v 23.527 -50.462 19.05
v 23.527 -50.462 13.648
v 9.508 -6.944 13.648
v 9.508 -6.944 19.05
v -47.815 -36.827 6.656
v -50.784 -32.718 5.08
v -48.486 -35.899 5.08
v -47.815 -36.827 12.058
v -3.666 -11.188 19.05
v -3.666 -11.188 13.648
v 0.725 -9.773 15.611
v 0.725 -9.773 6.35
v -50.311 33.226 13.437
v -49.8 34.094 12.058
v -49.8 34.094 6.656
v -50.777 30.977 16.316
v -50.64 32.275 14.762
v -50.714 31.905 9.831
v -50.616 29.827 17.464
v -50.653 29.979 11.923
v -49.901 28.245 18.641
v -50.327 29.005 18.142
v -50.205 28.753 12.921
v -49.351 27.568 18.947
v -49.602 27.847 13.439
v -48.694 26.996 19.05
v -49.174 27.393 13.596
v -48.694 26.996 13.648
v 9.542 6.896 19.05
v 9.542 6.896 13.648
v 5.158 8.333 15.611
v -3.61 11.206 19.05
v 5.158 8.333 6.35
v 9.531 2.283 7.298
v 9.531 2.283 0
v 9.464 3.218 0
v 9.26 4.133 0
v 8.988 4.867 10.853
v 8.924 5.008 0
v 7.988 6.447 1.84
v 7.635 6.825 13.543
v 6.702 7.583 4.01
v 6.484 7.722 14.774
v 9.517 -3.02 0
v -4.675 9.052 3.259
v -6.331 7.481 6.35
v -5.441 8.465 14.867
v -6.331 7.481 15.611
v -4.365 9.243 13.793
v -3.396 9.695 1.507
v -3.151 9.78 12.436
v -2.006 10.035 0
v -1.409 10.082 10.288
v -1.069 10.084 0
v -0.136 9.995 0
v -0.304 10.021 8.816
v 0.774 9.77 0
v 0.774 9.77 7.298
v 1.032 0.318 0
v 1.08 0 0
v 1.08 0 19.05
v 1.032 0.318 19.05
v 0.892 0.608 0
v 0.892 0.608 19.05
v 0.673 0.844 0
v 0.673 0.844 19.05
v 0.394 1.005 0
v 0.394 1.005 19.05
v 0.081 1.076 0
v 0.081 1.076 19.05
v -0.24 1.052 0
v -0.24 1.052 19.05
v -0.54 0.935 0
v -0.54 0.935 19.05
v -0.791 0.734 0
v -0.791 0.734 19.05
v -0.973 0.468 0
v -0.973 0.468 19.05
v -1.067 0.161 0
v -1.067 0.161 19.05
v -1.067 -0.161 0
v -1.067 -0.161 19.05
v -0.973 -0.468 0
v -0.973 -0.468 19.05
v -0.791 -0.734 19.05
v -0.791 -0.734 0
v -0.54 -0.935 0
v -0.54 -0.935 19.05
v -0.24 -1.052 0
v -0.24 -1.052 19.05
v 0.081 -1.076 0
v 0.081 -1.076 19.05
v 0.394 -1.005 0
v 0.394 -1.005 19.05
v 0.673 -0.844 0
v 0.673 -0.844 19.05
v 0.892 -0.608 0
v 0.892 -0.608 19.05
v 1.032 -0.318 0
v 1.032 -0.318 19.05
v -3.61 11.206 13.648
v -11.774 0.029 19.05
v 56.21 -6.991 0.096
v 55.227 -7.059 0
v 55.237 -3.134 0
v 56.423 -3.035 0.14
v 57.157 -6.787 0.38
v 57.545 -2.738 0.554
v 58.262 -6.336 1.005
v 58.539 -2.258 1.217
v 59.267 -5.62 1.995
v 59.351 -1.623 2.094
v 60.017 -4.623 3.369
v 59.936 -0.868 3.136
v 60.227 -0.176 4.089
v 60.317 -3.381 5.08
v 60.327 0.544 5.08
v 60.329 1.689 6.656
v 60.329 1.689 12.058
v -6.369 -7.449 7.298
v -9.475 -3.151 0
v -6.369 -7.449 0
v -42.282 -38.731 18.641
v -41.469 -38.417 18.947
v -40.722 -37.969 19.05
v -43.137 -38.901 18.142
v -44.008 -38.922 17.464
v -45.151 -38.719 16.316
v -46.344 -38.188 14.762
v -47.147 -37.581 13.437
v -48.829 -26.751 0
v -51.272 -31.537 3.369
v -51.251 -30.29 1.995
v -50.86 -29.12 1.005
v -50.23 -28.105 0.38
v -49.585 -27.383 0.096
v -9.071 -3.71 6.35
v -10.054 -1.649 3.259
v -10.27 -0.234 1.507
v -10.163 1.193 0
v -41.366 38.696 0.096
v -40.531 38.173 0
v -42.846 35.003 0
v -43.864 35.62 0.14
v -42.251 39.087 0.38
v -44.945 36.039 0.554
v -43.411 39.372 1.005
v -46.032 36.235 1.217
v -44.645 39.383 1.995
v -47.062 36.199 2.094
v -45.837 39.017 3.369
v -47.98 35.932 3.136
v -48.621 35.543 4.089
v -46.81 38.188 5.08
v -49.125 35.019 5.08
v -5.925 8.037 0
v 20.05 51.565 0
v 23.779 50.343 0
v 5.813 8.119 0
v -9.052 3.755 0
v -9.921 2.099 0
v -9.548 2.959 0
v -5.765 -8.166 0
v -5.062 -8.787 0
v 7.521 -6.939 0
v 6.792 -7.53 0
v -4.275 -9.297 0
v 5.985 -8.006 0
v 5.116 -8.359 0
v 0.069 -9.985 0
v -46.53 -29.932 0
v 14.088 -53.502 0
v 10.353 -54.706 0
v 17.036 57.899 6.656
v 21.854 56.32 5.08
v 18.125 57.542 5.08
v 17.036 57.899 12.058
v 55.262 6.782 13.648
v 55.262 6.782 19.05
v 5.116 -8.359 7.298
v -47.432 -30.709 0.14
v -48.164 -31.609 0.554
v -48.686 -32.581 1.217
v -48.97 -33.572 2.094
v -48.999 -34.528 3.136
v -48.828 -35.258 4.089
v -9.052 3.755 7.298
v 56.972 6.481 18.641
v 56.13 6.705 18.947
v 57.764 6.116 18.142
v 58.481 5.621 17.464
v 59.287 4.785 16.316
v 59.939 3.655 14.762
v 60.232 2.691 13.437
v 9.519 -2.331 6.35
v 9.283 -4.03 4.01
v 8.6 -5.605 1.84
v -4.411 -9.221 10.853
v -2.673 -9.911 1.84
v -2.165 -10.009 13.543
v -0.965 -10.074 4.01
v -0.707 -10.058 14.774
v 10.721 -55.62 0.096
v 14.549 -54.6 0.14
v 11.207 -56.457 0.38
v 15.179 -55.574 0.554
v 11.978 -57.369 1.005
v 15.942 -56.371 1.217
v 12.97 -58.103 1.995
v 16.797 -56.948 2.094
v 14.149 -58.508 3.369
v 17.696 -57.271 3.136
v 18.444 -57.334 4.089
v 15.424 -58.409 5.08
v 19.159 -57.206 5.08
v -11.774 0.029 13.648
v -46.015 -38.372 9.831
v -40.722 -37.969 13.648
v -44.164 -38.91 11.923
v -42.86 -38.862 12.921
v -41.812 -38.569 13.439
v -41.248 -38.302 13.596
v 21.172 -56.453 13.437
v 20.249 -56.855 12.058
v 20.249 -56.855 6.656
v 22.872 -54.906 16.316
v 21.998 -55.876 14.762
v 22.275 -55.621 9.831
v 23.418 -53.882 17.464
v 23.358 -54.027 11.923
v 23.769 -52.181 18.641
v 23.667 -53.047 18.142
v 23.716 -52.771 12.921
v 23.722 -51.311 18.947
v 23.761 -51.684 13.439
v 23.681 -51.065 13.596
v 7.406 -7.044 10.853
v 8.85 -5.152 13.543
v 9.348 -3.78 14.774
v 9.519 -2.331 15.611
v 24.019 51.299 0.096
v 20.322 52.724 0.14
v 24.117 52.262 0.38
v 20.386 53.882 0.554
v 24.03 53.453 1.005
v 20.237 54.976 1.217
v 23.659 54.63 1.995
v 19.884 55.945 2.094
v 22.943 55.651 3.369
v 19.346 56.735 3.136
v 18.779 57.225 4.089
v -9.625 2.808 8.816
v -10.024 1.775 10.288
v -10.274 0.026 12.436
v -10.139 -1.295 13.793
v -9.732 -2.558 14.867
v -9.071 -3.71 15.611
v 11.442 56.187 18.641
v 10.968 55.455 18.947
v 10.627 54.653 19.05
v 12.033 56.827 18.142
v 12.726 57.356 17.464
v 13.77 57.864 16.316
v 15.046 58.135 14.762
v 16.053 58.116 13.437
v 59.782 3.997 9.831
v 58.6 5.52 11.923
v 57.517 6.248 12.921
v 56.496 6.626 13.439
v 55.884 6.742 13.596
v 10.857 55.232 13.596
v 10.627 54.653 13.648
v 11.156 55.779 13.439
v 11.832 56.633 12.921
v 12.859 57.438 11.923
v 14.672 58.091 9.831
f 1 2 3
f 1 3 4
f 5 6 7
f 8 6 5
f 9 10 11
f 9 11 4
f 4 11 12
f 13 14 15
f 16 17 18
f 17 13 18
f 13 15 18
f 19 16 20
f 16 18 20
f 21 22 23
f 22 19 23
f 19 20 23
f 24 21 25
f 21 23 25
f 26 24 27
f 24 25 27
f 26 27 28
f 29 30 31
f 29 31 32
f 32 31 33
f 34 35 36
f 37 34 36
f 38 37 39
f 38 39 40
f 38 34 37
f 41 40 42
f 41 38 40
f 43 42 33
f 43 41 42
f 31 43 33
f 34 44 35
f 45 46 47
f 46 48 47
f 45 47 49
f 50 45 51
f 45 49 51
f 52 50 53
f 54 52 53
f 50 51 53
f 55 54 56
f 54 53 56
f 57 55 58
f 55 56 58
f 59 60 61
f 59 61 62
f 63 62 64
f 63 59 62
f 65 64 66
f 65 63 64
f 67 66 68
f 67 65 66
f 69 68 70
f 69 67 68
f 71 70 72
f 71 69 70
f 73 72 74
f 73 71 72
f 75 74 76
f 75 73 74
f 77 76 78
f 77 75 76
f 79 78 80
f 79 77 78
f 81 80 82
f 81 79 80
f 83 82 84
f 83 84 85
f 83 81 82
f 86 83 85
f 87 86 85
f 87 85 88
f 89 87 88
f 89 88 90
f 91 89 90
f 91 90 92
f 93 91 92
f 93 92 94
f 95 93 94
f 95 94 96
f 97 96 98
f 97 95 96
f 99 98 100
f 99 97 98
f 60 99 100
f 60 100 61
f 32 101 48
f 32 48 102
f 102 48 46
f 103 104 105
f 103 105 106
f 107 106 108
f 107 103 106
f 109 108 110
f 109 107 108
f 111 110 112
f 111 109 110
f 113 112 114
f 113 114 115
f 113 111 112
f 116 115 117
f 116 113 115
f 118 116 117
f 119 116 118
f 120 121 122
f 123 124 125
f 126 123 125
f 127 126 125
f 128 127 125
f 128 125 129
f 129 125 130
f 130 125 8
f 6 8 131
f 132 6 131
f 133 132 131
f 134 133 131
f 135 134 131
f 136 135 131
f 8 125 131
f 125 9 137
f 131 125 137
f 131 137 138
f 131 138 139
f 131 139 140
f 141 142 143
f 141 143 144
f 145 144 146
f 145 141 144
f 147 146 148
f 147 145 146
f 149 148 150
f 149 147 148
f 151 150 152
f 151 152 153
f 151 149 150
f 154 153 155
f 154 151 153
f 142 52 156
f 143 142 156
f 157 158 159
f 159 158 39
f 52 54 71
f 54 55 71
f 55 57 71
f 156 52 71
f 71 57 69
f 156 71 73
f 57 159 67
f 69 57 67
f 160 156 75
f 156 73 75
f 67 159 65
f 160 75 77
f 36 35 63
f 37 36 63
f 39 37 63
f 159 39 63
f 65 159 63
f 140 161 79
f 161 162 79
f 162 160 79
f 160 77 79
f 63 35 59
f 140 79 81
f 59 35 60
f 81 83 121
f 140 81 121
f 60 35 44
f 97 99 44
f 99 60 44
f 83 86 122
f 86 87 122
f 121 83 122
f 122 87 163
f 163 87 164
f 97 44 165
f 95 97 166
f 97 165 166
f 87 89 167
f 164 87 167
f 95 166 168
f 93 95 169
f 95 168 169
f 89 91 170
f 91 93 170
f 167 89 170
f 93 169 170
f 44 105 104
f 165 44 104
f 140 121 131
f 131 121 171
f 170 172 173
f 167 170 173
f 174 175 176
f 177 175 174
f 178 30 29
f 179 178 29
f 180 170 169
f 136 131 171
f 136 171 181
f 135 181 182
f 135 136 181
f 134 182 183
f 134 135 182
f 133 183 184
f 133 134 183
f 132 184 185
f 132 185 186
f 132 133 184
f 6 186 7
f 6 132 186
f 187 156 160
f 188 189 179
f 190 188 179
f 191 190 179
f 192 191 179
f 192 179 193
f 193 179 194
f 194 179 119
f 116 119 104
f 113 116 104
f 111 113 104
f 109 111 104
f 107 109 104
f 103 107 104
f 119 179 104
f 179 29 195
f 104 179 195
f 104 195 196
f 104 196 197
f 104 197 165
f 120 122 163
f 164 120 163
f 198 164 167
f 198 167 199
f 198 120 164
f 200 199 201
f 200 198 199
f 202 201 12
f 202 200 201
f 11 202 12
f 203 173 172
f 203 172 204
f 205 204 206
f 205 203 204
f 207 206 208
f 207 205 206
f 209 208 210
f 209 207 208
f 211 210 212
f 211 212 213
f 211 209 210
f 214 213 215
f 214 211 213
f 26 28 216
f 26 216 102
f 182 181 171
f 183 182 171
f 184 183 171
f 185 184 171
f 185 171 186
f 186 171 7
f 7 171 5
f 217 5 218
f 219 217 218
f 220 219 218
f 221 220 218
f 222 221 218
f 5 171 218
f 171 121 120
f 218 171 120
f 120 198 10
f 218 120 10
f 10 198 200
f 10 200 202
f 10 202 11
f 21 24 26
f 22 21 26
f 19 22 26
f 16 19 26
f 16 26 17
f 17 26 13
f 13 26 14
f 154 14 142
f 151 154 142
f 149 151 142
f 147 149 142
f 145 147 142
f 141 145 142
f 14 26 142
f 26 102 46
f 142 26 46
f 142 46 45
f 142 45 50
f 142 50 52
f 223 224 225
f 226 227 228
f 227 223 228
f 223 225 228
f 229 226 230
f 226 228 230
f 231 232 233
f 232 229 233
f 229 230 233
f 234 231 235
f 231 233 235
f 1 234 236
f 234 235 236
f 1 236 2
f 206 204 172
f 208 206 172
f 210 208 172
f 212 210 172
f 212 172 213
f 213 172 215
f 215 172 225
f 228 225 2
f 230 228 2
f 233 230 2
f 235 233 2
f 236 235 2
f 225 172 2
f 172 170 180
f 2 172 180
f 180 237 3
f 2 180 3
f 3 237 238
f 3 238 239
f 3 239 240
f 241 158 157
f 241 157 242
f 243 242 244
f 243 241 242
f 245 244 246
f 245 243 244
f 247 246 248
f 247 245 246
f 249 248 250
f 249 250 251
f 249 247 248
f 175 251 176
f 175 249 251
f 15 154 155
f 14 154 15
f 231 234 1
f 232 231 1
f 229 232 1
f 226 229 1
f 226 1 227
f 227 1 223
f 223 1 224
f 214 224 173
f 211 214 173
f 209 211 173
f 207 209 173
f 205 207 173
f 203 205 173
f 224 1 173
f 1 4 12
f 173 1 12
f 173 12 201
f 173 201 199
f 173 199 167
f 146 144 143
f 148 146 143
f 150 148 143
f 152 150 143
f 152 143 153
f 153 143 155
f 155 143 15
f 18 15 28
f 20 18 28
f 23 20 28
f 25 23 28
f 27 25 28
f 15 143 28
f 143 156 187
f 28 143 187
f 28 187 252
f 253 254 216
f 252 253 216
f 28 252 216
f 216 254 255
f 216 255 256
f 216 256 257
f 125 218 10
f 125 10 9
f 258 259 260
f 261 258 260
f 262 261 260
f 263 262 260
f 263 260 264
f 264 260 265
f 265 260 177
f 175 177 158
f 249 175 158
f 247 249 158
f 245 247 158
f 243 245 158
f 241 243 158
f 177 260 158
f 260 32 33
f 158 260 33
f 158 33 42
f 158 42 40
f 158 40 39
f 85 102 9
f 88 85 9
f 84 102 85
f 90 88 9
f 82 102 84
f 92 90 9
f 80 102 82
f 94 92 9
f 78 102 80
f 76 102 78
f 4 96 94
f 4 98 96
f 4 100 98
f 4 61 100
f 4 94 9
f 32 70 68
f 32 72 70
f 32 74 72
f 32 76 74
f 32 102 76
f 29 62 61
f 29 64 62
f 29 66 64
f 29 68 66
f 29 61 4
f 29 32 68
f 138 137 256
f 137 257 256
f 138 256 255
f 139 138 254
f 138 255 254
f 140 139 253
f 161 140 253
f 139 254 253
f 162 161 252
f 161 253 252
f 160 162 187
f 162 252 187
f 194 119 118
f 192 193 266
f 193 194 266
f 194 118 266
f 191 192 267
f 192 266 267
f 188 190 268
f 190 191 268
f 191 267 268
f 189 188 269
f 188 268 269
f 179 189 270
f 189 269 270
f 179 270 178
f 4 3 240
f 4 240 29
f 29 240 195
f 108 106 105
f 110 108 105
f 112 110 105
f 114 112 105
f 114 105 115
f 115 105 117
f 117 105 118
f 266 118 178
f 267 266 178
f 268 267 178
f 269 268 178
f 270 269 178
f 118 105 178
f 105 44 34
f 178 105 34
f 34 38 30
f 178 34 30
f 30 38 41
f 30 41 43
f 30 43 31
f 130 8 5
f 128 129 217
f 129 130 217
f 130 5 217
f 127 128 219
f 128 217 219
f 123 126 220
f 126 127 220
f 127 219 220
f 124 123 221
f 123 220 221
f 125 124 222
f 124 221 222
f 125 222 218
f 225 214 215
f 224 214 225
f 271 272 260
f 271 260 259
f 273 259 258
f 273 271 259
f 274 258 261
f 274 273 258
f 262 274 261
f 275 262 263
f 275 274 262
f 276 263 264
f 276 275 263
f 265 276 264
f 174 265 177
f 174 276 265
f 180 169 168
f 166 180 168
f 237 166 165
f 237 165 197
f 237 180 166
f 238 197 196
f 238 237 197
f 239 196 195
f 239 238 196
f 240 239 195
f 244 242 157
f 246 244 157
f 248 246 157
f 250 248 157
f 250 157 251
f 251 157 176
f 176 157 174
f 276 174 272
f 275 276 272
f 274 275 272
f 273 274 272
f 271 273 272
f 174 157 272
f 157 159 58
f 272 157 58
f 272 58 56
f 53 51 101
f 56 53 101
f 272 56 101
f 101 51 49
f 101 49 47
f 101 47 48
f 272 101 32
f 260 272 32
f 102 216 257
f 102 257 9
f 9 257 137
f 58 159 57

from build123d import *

# Parameters (mm, degrees)
F0_R          = 1.0795
F1_DEPTH      = 19.05
F3_DEPTH      = 50.8
F5_DEPTH      = 50.8
F7_DEPTH      = 50.8
F9_DEPTH      = 50.8
F11_DEPTH     = 50.8
F12_R         = 6.35
F13_T1_DEPTH  = 30.801632633
F13_T3_DEPTH  = 29.3245158286
F13_T5_DEPTH  = 29.3245158286
F13_T7_DEPTH  = 29.3245158286
F13_T9_DEPTH  = 29.3245158286
F13_T11_DEPTH = 29.3245158286


# Not quite as in the source:
# - a fillet or chamfer that OpenCascade refuses, or shapes differently, is made with other operations: its cross-section is extruded or revolved along the edge and cut away or added


with BuildPart() as f1:
    # F0 (on Top) → F1 (new body)
    with BuildSketch(Plane.XY):
        Polygon((-3.666268911, -11.1881585915), (9.5076317344, -6.9441600789), (9.5423084754, 6.8964316395), (-3.6101607654, 11.2063892332), (-11.7735105333, 0.0294977978), align=None)
        Circle(F0_R, mode=Mode.SUBTRACT)
    extrude(amount=F1_DEPTH)

    # F2 (on face) → F3 (join)
    with BuildSketch(Plane(origin=(-7.7198897222, -5.5793303969, 0), x_dir=(0.5857564721, -0.8104871099, 0), z_dir=(-0.8104871099, -0.5857564721, 0))):
        Polygon((6.9203175793, 19.05), (-6.9203175793, 0), (-2.9958017507, 0), (6.9203175793, 13.648367367), align=None)
    extrude(amount=F3_DEPTH)

    # F4 (on face) → F5 (join)
    with BuildSketch(Plane(origin=(2.9206814117, -9.0661593352, 0), x_dir=(0.9518277517, 0.3066332191, 0), z_dir=(0.3066332191, -0.9518277517, 0))):
        Polygon((6.9203175793, 19.05), (-6.9203175793, 0), (-2.9958017507, 0), (6.9203175793, 13.648367367), align=None)
    extrude(amount=F5_DEPTH)

    # F6 (on face) → F7 (join)
    with BuildSketch(Plane(origin=(9.5249701049, -0.0238642197, 0), x_dir=(0.0025054299, 0.9999968614, 0), z_dir=(0.9999968614, -0.0025054299, 0))):
        Polygon((6.9203175793, 19.05), (-6.9203175793, 0), (-2.9958017507, 0), (6.9203175793, 13.648367367), align=None)
    extrude(amount=F7_DEPTH)

    # F8 (on face) → F9 (join)
    with BuildSketch(Plane(origin=(2.966073855, 9.0514104363, 0), x_dir=(-0.9502793109, 0.3113988299, 0), z_dir=(0.3113988299, 0.9502793109, 0))):
        Polygon((6.9203175793, 19.05), (-6.9203175793, 0), (-2.9958017507, 0), (6.9203175793, 13.648367367), align=None)
    extrude(amount=F9_DEPTH)

    # F10 (on face) → F11 (join)
    with BuildSketch(Plane(origin=(-7.6918356494, 5.6179435155, 0), x_dir=(-0.5898103428, -0.8075418005, 0), z_dir=(-0.8075418005, 0.5898103428, 0))):
        Polygon((6.9203175793, 19.05), (-6.9203175793, 0), (-2.9958017507, 0), (6.9203175793, 13.648367367), align=None)
    extrude(amount=F11_DEPTH)

    # F12
    f12_edges = [f1.edges().sort_by_distance(p)[0] for p in [
        (-3.610161, 11.206389, 6.824184),
        (-11.773511, 0.029498, 6.824184),
        (-3.666269, -11.188159, 6.824184),
        (9.507632, -6.94416, 6.824184),
        (9.542308, 6.896432, 6.824184),
    ]]
    fillet(f12_edges, radius=F12_R)

    # F13: fillet of radius 5.08 on 10 edges, made by hand

    # F13_s2 → F13_t1 (cut)
    with BuildSketch(Plane.XY.offset(0.948367367)):
        with BuildLine():
            ThreePointArc((-49.800397455, 34.09417556), (-50.7175171639, 30.3158253164), (-48.6943216503, 26.9956266721))
            Line((-48.6943216503, 26.9956266721), (-52.7966339966, 29.9918632137))
            Line((-52.7966339966, 29.9918632137), (-49.800397455, 34.09417556))
        make_face()
        with BuildLine():
            ThreePointArc((-47.8146569743, -36.8273128564), (-44.5046379302, -38.8671199678), (-40.7217395774, -37.9689444966))
            Line((-40.7217395774, -37.9689444966), (-44.8390140959, -40.9445873749))
            Line((-44.8390140959, -40.9445873749), (-47.8146569743, -36.8273128564))
        make_face()
        with BuildLine():
            ThreePointArc((20.2493142845, -56.8547066196), (23.2121382661, -54.3370265013), (23.5269025104, -50.4617248879))
            Line((23.5269025104, -50.4617248879), (25.0845992633, -55.2970098667))
            Line((25.0845992633, -55.2970098667), (20.2493142845, -56.8547066196))
        make_face()
        with BuildLine():
            ThreePointArc((60.329421451, 1.6891717451), (58.8505283301, 5.2849907424), (55.2621649789, 6.7818833849))
            Line((55.2621649789, 6.7818833849), (60.3421490348, 6.769155801))
            Line((60.3421490348, 6.769155801), (60.329421451, 1.6891717451))
        make_face()
        with BuildLine():
            ThreePointArc((10.6269937385, 54.6531593275), (13.1594884979, 57.6033304103), (17.0363186938, 57.8986721709))
            Line((17.0363186938, 57.8986721709), (12.2088997945, 59.4805782269))
            Line((12.2088997945, 59.4805782269), (10.6269937385, 54.6531593275))
        make_face()
    extrude(amount=F13_T1_DEPTH, mode=Mode.SUBTRACT)

    # F13_s4 → F13_t3 (cut)
    with BuildSketch(Plane(origin=(11.5722662379, 15.8442265835, 0), x_dir=(0, 0, 1), z_dir=(-0.5898103428, -0.8075418005, 0))):
        with BuildLine():
            ThreePointArc((0, 55.245), (1.4878975516, 58.8371024484), (5.08, 60.325))
            Line((5.08, 60.325), (0, 60.325))
            Line((0, 60.325), (0, 55.245))
        make_face()
    extrude(amount=F13_T3_DEPTH, mode=Mode.SUBTRACT)

    # F13_s6 → F13_t5 (cut)
    with BuildSketch(Plane(origin=(-11.492728007, 15.9020144909, 0), x_dir=(0, 0, 1), z_dir=(0.5857564721, -0.8104871099, 0))):
        with BuildLine():
            ThreePointArc((0, 55.245), (1.4878975516, 58.8371024484), (5.08, 60.325))
            Line((5.08, 60.325), (0, 60.325))
            Line((0, 60.325), (0, 55.245))
        make_face()
    extrude(amount=F13_T5_DEPTH, mode=Mode.SUBTRACT)

    # F13_s8 → F13_t7 (cut)
    with BuildSketch(Plane(origin=(-18.6751627697, -6.0162411386, 0), x_dir=(0, 0, 1), z_dir=(0.9518277517, 0.3066332191, 0))):
        with BuildLine():
            ThreePointArc((0, 55.245), (1.4878975516, 58.8371024484), (5.08, 60.325))
            Line((5.08, 60.325), (0, 60.325))
            Line((0, 60.325), (0, 55.245))
        make_face()
    extrude(amount=F13_T7_DEPTH, mode=Mode.SUBTRACT)

    # F13_s10 → F13_t9 (cut)
    with BuildSketch(Plane(origin=(-0.0491573301, -19.620255999, 0), x_dir=(0, 0, 1), z_dir=(0.0025054299, 0.9999968614, 0))):
        with BuildLine():
            ThreePointArc((0, 55.245), (1.4878975516, 58.8371024484), (5.08, 60.325))
            Line((5.08, 60.325), (0, 60.325))
            Line((0, 60.325), (0, 55.245))
        make_face()
    extrude(amount=F13_T9_DEPTH, mode=Mode.SUBTRACT)

    # F13_s12 → F13_t11 (cut)
    with BuildSketch(Plane(origin=(18.6447818689, -6.1097439368, 0), x_dir=(0, 0, 1), z_dir=(-0.9502793109, 0.3113988299, 0))):
        with BuildLine():
            ThreePointArc((0, 55.245), (1.4878975516, 58.8371024484), (5.08, 60.325))
            Line((5.08, 60.325), (0, 60.325))
            Line((0, 60.325), (0, 55.245))
        make_face()
    extrude(amount=F13_T11_DEPTH, mode=Mode.SUBTRACT)


solid = f1.part
